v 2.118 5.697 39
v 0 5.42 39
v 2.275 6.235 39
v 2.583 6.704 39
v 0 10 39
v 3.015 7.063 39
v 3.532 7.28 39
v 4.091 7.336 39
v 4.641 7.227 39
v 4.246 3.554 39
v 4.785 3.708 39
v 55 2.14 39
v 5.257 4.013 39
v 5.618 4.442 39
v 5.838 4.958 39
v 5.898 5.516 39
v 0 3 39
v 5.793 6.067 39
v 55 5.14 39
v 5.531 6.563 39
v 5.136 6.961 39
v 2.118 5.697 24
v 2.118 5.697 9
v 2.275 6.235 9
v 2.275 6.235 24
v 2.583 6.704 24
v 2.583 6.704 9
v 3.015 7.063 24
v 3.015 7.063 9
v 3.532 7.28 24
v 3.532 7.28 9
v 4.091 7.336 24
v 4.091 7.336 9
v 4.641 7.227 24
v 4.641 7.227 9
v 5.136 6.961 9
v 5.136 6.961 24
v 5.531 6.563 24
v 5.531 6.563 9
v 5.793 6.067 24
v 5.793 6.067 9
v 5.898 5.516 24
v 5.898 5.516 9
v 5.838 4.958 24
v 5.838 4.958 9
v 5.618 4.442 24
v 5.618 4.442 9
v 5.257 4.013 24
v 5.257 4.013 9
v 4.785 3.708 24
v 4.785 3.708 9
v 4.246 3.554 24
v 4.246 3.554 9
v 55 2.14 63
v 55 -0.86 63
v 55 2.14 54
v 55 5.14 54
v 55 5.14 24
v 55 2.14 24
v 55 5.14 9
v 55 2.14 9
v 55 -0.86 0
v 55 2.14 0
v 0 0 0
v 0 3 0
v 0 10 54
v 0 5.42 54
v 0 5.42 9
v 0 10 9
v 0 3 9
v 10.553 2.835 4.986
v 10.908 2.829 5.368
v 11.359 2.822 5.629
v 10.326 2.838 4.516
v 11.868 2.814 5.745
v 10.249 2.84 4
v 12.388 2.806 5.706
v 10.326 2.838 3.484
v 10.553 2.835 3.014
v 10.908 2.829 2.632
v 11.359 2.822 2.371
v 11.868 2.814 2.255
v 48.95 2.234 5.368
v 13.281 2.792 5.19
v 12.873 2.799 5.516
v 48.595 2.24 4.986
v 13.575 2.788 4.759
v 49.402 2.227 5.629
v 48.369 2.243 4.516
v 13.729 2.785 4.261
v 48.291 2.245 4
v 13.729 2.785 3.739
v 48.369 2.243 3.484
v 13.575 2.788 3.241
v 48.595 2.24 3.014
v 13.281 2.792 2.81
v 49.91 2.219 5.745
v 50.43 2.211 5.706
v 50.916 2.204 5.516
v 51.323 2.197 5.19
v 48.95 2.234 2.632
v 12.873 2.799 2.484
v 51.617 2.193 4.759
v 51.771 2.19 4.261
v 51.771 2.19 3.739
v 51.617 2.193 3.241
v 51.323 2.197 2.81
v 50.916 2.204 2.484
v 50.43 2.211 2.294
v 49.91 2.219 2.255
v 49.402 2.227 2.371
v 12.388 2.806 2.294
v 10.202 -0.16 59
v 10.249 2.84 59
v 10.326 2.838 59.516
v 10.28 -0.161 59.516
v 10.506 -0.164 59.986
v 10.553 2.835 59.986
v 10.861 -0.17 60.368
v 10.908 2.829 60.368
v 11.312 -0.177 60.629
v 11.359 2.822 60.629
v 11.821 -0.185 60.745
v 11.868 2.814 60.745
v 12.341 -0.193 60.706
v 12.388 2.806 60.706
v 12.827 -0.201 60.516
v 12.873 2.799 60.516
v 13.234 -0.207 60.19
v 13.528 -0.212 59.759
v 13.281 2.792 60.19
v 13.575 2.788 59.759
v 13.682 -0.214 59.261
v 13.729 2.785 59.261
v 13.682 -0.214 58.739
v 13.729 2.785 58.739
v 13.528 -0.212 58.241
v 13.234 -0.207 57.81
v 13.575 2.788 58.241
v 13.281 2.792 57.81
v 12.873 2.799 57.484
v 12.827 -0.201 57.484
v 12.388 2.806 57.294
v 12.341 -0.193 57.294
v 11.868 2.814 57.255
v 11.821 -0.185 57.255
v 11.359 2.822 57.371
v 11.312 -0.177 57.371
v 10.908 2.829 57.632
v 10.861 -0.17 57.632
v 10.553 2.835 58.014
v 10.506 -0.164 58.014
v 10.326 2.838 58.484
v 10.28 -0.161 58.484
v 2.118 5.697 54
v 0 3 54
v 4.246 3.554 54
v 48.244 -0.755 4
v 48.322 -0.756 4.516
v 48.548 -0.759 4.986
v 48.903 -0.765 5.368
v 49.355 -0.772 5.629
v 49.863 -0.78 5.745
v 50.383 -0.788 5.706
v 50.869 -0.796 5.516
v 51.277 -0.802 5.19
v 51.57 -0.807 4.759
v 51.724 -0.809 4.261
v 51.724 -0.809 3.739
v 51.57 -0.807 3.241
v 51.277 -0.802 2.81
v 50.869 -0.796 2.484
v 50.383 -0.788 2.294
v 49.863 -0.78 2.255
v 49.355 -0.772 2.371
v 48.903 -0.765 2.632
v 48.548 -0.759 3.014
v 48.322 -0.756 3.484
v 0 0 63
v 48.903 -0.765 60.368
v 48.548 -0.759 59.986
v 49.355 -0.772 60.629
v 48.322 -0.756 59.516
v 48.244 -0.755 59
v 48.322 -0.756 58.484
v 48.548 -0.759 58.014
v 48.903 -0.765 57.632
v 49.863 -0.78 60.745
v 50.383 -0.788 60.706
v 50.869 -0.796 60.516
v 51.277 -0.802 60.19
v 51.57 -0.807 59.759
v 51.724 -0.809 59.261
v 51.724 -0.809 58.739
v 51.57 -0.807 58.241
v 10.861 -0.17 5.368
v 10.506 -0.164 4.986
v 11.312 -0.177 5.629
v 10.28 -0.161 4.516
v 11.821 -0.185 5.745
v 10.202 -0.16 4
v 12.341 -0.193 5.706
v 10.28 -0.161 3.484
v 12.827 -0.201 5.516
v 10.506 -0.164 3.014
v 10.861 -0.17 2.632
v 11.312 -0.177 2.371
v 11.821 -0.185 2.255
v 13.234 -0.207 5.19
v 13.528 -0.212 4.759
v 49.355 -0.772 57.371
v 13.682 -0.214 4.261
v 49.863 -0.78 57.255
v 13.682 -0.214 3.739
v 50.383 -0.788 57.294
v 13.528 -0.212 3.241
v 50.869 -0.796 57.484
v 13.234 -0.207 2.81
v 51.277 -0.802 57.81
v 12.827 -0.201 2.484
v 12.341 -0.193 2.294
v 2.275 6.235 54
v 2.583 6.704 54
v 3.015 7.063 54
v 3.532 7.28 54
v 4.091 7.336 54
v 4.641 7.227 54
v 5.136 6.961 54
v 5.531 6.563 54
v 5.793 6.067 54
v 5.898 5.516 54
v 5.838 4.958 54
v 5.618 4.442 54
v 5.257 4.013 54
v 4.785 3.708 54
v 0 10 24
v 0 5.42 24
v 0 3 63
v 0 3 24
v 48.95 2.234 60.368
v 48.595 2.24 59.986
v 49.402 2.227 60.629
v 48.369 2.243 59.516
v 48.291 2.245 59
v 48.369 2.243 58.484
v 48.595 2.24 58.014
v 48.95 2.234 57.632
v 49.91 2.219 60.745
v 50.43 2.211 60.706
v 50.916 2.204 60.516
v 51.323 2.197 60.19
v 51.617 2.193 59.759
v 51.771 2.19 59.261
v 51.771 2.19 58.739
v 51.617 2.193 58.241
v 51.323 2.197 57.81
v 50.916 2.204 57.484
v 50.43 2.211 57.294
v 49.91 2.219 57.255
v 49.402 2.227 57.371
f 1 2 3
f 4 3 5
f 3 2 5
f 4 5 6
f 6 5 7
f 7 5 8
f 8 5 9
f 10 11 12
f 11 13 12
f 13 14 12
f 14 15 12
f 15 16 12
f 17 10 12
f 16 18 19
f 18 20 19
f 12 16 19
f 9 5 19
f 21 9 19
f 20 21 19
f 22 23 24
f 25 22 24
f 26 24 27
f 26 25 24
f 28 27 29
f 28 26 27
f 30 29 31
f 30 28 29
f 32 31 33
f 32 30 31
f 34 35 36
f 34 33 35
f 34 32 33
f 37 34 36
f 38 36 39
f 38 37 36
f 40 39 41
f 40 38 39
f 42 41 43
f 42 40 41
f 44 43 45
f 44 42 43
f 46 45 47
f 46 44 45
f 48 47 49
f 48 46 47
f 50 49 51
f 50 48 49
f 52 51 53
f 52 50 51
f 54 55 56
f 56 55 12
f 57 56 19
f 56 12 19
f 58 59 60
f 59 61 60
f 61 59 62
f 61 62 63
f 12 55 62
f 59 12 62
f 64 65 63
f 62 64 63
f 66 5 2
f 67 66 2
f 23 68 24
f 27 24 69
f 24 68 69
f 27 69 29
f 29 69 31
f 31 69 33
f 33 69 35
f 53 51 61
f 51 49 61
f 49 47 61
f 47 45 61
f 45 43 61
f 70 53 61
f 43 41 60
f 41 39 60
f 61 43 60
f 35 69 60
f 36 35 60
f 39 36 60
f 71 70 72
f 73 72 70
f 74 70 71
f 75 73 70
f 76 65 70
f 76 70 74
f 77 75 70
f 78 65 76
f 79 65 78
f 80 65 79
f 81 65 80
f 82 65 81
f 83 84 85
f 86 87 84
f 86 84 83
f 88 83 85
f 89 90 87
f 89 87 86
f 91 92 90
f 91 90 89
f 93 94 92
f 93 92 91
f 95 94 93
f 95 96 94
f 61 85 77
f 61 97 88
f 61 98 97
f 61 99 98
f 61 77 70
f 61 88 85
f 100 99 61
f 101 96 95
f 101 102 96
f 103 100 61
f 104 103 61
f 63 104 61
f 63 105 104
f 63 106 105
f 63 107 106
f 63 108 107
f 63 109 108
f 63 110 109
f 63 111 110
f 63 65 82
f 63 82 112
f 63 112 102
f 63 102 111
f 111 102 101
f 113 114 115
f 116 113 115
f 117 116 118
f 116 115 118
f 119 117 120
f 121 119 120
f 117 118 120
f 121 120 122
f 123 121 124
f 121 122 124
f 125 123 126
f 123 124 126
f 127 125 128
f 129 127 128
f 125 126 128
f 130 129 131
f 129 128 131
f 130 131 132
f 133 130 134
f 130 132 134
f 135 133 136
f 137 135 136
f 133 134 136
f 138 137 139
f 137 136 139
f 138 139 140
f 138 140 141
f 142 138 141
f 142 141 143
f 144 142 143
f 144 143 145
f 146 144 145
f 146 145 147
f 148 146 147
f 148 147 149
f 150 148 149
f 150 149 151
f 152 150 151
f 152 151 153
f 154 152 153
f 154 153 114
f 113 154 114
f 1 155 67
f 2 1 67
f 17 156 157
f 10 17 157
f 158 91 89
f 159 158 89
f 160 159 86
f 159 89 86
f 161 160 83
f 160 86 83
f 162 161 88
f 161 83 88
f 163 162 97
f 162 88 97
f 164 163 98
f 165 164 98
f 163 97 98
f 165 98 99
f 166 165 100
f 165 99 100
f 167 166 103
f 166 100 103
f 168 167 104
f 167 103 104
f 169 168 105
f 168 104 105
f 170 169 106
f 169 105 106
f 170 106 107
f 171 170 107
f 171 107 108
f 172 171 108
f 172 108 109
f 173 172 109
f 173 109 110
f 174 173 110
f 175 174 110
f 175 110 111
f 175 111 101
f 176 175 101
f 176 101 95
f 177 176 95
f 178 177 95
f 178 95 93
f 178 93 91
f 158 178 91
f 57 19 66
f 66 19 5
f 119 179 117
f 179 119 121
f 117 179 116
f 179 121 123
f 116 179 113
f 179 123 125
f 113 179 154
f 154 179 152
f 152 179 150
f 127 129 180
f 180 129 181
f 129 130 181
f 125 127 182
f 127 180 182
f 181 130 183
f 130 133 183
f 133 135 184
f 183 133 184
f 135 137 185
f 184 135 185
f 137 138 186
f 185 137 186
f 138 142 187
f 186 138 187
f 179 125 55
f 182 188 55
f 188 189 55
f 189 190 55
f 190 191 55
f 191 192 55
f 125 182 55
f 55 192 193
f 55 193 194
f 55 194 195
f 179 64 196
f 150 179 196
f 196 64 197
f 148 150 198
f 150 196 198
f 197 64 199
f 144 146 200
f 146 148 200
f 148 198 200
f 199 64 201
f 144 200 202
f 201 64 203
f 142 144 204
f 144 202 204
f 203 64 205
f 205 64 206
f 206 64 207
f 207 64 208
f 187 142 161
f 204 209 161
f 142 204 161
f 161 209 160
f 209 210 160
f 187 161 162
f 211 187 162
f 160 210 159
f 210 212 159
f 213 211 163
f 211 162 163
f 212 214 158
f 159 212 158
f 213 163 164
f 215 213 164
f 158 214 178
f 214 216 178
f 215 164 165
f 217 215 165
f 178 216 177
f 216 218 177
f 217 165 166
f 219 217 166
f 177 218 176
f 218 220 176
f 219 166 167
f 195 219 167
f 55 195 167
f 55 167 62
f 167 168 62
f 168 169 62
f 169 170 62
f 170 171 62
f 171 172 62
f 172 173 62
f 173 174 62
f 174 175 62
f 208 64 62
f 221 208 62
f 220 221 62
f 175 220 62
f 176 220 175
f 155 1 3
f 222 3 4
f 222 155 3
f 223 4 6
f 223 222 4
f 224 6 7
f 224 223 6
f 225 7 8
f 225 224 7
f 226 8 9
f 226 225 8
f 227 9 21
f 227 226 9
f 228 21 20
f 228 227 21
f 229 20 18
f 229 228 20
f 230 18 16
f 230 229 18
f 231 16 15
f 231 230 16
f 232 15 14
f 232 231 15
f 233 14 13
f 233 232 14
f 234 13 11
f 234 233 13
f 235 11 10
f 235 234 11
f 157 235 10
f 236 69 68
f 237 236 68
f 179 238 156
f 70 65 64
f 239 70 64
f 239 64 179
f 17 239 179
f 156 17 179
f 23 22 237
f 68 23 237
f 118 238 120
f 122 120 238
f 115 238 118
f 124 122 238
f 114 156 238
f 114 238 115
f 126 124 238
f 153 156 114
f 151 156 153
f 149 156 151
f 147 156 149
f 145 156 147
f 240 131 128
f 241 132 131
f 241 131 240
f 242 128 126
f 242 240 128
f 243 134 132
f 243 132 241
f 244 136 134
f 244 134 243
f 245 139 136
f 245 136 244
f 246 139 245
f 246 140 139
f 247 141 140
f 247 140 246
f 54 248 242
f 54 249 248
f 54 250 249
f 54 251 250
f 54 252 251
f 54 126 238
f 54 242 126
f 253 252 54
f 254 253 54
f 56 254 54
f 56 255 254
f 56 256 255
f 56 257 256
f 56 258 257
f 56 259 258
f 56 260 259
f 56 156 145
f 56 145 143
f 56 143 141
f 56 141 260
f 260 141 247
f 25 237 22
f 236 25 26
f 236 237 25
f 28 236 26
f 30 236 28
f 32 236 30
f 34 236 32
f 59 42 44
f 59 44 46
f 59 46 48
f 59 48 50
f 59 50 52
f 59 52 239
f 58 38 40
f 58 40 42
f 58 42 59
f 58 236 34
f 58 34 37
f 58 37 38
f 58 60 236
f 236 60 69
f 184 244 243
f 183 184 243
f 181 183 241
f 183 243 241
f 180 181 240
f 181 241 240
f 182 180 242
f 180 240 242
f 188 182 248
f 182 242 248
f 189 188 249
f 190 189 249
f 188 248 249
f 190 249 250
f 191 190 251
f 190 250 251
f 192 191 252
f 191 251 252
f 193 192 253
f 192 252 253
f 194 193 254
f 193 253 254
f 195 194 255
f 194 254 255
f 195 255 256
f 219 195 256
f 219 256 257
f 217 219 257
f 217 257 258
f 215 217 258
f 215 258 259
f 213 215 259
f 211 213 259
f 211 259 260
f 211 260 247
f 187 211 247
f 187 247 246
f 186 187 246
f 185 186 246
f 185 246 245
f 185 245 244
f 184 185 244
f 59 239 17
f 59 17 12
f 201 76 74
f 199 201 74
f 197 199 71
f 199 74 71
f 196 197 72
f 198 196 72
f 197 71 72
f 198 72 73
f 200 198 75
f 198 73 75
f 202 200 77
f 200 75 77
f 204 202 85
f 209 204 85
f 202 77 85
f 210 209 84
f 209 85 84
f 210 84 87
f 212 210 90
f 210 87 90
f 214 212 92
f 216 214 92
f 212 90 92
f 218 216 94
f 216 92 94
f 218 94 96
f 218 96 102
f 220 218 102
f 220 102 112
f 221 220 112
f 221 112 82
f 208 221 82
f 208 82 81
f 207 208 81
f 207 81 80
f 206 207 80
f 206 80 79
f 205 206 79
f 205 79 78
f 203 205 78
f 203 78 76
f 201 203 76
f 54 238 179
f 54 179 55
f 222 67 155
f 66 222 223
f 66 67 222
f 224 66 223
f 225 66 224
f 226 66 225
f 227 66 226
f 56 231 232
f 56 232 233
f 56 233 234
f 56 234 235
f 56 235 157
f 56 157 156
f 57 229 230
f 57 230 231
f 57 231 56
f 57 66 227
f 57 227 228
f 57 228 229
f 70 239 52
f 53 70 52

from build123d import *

# Parameters (mm, degrees)
BOSS_EXTRUDE1_DEPTH     = 63
CUT_EXTRUDE1_START      = 24
CUT_EXTRUDE1_DEPTH      = 15
CUT_EXTRUDE1_2_DEPTH    = 9
CUT_EXTRUDE1_START_2    = 54
CUT_EXTRUDE1_3_DEPTH    = 9
CUT_EXTRUDE2_DEPTH      = 78.723870207
CUT_EXTRUDE2_DEPTH_BACK = 78.723870207
SKETCH3_R               = 1.9
SKETCH4_R               = 1.75
CUT_EXTRUDE3_DEPTH      = 84.891904797
CUT_EXTRUDE4_DEPTH      = 78.723870207


# Read off the part's stored shape, not the designer's step: Cut-Extrude1
with BuildPart() as part:
    # Sketch1 → Boss-Extrude1 (new body)
    with BuildSketch(Plane.XY):
        Polygon((0, 0), (55, -0.860341408), (55, 5.139658592), (0, 10), align=None)
    extrude(amount=BOSS_EXTRUDE1_DEPTH)

    # Cut-Extrude1 outline → Cut-Extrude1 (cut)
    with BuildSketch(Plane.XY.offset(CUT_EXTRUDE1_START)):
        Polygon((0, 10), (0, 3), (55, 2.139658592), (55, 5.139658592), align=None)
    extrude(amount=CUT_EXTRUDE1_DEPTH, mode=Mode.SUBTRACT)

    # Cut-Extrude1 2 outline → Cut-Extrude1 2 (cut)
    with BuildSketch(Plane.XY):
        Polygon((0, 10), (0, 3), (55, 2.139658592), (55, 5.139658592), align=None)
    extrude(amount=CUT_EXTRUDE1_2_DEPTH, mode=Mode.SUBTRACT)

    # Cut-Extrude1 3 outline → Cut-Extrude1 3 (cut)
    with BuildSketch(Plane.XY.offset(CUT_EXTRUDE1_START_2)):
        Polygon((0, 10), (0, 3), (55, 2.139658592), (55, 5.139658592), align=None)
    extrude(amount=CUT_EXTRUDE1_3_DEPTH, mode=Mode.SUBTRACT)

    # Sketch3 → Cut-Extrude2 (cut, two sides: drawn at the far end of the back side and taken through both)
    with BuildSketch(Plane(origin=(0, 0, 9), x_dir=(-1, 0, 0), z_dir=(0, 0, -1)).offset(-CUT_EXTRUDE2_DEPTH_BACK)):
        with Locations(Location((-4, 5.438102572, 0), (0, 0, 90))):
            Circle(SKETCH3_R)
    extrude(amount=CUT_EXTRUDE2_DEPTH + CUT_EXTRUDE2_DEPTH_BACK, mode=Mode.SUBTRACT)

    # Sketch4 → Cut-Extrude3 (cut, through all)
    with BuildSketch(Plane(origin=(0.046916233, 2.999266109, 0), x_dir=(0.9998776774332501, -0.01564065761691552, 0), z_dir=(0.01564065761691552, 0.9998776774332501, 0))):
        with Locations(Location((11.953078027, -59, 0), (0, 0, 180))):
            Circle(SKETCH4_R)
        with Locations(Location((50, -59, 0), (0, 0, 180))):
            Circle(SKETCH4_R)
        with Locations(Location((50, -4, 0), (0, 0, 180))):
            Circle(SKETCH4_R)
        with Locations(Location((11.953078027, -4, 0), (0, 0, 180))):
            Circle(SKETCH4_R)
    extrude(amount=-CUT_EXTRUDE3_DEPTH, mode=Mode.SUBTRACT)

    # Sketch6 → Cut-Extrude4 (cut, through all)
    with BuildSketch(Plane.XY.offset(54)):
        Polygon((2.117680715, 5.69670286), (0, 5.420349449), (0, 3), (4.245861834, 3.554077106), align=None)
    extrude(amount=-CUT_EXTRUDE4_DEPTH, mode=Mode.SUBTRACT)


solid = part.part
